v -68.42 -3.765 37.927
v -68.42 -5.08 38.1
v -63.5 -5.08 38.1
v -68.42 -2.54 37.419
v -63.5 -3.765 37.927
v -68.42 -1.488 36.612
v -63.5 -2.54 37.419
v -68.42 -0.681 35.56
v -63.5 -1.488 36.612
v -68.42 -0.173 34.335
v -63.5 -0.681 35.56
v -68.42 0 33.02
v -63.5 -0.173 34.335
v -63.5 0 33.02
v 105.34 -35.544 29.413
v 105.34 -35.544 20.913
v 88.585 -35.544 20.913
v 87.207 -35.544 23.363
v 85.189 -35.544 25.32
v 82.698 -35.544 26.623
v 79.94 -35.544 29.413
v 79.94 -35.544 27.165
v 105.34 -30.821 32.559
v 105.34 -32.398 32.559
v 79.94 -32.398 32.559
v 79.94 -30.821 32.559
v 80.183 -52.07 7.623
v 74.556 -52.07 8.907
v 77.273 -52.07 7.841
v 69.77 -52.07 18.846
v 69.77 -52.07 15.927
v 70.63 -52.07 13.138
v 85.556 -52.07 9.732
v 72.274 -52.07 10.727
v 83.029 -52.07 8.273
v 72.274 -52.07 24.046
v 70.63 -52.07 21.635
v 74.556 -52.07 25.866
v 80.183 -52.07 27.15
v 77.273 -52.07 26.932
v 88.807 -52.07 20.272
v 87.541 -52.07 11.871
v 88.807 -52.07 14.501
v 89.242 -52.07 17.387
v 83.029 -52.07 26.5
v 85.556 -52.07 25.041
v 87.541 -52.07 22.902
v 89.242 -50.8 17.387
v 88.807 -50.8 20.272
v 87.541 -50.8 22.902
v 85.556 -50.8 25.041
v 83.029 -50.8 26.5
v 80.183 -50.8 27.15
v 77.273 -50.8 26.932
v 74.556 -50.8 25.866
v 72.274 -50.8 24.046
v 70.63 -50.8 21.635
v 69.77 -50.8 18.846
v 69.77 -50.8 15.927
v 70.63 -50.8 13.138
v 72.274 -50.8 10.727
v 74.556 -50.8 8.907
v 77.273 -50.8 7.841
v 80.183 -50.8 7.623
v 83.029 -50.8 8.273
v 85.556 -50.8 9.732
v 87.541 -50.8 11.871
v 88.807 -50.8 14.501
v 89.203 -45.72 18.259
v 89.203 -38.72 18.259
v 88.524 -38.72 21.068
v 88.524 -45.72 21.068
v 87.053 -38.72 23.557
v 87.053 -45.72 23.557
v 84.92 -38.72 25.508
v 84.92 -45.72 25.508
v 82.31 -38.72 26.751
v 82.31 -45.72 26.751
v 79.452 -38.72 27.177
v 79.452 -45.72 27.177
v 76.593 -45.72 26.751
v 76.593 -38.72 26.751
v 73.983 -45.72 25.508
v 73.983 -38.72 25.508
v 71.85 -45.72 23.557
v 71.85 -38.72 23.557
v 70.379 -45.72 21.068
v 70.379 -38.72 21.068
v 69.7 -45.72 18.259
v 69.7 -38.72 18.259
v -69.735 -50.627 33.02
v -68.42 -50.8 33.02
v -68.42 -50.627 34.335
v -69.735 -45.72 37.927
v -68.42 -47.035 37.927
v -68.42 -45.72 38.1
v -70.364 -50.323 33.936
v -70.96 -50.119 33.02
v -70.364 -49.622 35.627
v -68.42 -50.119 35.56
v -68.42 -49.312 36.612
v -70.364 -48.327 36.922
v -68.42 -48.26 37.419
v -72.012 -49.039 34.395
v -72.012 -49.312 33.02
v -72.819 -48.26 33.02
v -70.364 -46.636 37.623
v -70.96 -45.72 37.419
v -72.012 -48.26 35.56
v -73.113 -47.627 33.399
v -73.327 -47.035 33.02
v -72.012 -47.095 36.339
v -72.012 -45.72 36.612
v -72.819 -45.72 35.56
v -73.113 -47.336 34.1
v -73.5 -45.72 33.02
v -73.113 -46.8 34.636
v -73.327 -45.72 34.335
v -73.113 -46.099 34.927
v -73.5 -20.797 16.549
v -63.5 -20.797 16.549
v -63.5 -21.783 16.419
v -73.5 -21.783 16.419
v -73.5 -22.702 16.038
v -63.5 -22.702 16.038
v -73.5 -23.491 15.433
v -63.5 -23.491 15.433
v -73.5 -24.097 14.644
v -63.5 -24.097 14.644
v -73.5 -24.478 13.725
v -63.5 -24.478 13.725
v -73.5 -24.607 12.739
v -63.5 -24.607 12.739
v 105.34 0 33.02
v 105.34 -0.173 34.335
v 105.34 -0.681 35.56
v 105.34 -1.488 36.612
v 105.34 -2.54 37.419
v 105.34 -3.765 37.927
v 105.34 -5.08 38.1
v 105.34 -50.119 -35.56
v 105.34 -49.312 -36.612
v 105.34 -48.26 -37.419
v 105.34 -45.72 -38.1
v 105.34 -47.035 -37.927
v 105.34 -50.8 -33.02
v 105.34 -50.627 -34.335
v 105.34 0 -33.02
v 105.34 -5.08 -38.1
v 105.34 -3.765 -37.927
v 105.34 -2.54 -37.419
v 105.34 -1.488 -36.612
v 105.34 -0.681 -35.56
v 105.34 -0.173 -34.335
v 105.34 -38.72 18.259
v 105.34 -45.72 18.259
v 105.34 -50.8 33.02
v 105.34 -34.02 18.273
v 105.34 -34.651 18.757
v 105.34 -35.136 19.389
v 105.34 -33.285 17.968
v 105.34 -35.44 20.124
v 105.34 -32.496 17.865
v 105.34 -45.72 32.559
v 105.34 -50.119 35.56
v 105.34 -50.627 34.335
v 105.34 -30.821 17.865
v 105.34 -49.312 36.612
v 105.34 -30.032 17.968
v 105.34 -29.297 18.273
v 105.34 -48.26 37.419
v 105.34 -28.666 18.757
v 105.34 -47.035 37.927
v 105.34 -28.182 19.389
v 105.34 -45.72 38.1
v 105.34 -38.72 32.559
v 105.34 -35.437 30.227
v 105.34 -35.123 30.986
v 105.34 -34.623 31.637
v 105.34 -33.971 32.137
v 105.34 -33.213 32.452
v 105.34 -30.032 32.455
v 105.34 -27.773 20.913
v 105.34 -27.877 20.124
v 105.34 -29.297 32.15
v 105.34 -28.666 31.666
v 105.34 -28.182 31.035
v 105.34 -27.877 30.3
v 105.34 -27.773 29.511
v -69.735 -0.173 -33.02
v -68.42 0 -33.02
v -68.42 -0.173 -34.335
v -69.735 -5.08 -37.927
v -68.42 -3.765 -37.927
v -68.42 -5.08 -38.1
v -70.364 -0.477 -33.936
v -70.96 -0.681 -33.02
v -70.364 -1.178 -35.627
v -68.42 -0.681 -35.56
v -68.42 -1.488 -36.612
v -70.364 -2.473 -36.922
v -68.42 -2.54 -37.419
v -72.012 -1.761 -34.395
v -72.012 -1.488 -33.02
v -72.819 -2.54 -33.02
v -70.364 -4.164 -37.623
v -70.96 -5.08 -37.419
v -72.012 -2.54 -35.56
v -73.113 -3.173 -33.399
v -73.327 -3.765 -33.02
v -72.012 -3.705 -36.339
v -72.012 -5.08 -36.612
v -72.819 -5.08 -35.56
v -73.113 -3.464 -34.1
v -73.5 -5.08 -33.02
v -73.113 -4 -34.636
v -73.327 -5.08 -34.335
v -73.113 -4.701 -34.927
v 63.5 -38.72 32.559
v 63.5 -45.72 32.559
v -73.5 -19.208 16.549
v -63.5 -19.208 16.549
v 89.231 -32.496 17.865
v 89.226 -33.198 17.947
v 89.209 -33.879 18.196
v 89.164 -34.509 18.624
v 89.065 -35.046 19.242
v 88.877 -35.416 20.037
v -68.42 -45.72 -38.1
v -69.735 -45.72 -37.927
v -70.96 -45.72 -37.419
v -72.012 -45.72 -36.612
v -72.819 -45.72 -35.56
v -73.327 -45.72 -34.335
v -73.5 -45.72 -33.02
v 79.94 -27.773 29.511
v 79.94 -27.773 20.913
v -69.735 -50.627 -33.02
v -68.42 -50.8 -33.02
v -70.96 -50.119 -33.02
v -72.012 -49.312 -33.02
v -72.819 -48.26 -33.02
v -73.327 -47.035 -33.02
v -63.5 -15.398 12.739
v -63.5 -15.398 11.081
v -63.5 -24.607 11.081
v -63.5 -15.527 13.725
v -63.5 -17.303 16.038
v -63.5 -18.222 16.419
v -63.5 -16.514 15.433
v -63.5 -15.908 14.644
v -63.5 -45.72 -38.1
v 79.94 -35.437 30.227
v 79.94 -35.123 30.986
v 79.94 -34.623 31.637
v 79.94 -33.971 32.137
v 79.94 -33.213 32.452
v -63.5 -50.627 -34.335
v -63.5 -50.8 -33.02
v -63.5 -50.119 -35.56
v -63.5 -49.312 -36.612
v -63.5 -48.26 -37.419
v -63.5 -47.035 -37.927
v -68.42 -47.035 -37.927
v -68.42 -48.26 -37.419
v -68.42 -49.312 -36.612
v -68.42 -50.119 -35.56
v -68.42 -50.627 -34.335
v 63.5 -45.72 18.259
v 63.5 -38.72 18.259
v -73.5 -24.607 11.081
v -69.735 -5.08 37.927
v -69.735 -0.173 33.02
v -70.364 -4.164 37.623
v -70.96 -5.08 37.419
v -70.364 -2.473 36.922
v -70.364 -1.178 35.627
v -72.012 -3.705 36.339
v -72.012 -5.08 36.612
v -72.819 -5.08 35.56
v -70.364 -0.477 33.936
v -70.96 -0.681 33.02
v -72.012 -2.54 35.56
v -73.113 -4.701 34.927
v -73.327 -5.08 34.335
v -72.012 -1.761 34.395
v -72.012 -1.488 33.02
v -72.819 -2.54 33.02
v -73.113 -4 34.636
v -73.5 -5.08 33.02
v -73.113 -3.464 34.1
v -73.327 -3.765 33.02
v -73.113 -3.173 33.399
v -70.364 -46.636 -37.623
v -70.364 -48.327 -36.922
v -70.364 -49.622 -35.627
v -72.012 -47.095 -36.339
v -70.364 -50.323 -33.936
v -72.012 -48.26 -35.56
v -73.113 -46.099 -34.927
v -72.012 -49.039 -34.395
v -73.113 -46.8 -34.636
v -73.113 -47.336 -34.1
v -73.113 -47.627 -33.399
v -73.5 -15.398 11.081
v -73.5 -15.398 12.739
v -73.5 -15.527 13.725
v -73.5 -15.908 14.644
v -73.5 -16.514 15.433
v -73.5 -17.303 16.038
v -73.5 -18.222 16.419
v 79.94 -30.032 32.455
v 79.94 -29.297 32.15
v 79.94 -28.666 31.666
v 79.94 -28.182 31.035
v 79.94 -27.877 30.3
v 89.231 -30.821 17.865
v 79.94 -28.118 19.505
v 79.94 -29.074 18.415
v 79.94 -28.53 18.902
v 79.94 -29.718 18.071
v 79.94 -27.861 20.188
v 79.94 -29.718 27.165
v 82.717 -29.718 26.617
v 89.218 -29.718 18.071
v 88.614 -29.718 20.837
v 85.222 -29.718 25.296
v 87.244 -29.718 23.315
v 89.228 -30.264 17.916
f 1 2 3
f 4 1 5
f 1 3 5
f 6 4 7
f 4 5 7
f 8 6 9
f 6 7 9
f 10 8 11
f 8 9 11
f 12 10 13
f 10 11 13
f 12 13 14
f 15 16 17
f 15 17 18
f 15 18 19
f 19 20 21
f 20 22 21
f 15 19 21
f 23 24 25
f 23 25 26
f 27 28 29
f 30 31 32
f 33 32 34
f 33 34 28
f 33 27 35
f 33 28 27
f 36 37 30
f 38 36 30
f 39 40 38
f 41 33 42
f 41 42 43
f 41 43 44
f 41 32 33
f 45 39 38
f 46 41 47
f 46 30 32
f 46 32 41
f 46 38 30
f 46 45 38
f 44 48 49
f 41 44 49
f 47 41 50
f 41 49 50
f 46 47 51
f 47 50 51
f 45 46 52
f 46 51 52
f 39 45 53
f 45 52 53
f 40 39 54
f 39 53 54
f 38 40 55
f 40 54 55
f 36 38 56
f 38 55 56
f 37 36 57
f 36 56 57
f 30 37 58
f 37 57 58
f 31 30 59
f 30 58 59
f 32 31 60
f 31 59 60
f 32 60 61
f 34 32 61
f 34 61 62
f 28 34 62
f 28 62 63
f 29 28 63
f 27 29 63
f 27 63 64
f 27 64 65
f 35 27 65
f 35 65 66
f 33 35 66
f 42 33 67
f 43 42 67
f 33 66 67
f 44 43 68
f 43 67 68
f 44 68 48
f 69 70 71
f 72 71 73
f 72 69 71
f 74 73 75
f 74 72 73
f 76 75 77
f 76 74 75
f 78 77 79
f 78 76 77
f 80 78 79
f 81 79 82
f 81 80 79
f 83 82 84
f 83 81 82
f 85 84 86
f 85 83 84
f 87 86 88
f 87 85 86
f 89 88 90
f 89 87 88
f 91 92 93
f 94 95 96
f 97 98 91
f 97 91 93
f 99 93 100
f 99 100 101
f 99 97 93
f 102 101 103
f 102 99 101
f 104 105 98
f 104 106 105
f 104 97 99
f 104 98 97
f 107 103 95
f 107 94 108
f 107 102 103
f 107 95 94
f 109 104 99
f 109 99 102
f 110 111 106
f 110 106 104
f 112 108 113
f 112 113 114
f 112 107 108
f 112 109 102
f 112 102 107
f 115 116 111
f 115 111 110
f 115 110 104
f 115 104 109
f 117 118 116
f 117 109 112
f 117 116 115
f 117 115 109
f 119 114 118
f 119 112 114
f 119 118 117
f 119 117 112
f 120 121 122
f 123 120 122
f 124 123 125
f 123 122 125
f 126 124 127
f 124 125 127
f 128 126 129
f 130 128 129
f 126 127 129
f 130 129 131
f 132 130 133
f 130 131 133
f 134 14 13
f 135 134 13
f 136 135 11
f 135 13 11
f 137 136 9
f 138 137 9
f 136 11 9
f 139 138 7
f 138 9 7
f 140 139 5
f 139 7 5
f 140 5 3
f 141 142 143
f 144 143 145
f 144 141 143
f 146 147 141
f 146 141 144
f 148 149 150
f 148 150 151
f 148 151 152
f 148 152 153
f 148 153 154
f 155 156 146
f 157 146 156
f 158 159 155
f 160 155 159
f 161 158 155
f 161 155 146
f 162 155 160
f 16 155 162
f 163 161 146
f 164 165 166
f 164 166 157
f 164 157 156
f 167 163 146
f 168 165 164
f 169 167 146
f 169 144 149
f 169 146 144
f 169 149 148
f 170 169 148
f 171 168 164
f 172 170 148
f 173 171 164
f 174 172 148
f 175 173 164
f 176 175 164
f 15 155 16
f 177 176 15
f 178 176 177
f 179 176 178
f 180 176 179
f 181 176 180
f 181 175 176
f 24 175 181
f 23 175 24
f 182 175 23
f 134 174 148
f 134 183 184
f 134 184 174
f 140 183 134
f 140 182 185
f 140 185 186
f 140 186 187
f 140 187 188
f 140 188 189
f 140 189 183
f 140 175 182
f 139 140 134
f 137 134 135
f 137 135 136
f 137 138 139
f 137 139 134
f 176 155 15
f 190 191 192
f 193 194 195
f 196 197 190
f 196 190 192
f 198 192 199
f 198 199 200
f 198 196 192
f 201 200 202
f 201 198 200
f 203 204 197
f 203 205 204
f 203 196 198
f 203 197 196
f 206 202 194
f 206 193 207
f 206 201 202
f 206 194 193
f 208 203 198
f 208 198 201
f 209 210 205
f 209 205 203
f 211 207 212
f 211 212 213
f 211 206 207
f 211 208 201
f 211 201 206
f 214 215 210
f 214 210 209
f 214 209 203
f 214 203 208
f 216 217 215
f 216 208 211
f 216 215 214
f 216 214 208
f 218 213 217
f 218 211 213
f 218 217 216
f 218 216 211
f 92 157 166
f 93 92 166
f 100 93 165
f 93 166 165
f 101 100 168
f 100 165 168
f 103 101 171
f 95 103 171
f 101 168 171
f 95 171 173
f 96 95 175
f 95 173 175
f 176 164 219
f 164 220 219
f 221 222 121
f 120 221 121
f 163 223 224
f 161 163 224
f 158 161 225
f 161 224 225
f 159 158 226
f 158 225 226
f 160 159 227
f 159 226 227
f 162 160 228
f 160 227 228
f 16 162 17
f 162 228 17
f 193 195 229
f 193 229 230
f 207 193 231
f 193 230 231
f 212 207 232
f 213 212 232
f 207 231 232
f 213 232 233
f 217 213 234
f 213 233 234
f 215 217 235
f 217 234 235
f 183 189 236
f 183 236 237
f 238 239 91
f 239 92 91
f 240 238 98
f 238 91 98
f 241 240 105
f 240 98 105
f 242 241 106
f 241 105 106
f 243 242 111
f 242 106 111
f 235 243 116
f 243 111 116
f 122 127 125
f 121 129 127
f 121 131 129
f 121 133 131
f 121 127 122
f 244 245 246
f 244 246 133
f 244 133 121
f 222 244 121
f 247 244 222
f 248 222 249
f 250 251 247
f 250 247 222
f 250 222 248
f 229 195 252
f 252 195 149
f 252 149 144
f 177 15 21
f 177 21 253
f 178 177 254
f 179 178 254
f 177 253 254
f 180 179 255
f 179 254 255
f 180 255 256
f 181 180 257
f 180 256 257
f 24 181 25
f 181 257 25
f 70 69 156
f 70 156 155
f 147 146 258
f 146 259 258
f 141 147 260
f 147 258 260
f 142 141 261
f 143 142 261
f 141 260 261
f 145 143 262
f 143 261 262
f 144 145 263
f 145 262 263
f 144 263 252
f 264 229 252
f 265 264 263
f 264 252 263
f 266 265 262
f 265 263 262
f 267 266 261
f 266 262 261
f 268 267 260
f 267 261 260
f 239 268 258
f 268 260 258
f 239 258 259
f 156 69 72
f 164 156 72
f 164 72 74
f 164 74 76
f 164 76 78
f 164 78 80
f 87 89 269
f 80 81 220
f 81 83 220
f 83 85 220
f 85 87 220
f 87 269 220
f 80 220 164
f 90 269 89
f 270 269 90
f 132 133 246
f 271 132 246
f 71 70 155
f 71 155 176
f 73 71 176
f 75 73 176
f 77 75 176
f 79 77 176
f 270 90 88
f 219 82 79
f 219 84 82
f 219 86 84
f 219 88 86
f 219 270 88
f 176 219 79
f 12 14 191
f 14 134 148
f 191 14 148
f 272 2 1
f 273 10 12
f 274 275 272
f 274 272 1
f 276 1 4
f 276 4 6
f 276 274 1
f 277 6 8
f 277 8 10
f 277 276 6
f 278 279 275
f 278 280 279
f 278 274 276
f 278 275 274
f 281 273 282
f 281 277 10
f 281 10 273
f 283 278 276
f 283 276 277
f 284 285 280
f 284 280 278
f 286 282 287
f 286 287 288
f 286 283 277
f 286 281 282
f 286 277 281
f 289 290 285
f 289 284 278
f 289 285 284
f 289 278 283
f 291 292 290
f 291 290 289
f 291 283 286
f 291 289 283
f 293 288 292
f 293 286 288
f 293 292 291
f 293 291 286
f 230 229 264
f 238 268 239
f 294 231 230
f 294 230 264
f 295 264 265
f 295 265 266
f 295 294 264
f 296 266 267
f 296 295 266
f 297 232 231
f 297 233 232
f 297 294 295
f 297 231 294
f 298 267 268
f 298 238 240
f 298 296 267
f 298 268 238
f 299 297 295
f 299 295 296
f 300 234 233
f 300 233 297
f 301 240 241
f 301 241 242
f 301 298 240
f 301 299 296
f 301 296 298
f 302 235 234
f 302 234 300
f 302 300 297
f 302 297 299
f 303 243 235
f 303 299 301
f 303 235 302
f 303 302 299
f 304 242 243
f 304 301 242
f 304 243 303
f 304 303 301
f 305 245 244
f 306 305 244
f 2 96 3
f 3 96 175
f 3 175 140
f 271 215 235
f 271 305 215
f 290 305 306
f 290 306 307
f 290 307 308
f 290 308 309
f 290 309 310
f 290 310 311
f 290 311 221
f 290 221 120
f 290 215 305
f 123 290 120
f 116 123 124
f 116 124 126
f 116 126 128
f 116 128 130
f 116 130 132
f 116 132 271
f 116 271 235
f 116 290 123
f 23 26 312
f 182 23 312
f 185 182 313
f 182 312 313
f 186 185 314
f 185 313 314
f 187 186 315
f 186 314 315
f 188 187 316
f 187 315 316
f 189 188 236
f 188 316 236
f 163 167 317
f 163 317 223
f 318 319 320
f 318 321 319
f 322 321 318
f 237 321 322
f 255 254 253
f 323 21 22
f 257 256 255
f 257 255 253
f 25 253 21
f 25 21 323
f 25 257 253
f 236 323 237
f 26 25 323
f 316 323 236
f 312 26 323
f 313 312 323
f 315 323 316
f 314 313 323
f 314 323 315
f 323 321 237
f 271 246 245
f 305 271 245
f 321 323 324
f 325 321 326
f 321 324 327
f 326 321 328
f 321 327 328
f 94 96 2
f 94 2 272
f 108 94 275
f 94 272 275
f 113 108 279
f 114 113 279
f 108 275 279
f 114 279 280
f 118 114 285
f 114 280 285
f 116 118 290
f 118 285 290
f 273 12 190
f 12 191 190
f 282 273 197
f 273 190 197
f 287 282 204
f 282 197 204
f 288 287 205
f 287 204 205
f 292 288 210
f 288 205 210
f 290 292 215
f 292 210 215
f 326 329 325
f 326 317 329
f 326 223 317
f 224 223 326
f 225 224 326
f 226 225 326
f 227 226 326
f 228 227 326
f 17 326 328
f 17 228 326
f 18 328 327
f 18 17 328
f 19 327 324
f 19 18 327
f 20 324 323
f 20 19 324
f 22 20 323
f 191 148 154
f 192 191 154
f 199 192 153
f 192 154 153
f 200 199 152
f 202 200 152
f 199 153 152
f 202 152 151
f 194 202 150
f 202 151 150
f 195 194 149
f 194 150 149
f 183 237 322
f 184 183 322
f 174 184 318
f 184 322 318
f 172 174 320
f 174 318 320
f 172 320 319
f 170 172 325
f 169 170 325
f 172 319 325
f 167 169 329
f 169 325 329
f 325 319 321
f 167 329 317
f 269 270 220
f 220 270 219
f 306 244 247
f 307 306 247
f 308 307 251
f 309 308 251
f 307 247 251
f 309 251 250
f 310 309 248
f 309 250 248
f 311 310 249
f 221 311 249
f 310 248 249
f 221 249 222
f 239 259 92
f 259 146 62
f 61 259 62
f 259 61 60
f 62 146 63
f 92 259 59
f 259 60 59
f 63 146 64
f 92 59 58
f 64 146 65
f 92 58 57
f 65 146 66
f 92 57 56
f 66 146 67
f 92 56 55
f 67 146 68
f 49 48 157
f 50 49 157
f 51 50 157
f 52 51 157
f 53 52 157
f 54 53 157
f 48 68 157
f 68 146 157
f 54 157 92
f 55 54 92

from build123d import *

# Parameters (mm, degrees)
F0_W      = 127
F0_H      = 76.2
F1_DEPTH  = 50.8
F2_R      = 5.08
F3_W      = 7
F3_H      = 14.7
F4_DEPTH  = 16.4
F5_W      = 7
F5_H      = 14.3
F6_DEPTH  = 16.44
F7_W      = 7
F7_H      = 14.3
F8_DEPTH  = 25.4
F9_R      = 9.7907841867
F10_DEPTH = 1.27
F11_DEPTH = 22.352
F13_DEPTH = 25.4
F14_DEPTH = 25.4
F15_DEPTH = 25.4
F16_DEPTH = 10
F17_R     = 5.08


with BuildPart() as f1:
    # F0 (on Front) → F1 (new body)
    with BuildSketch(Plane.XZ):
        Rectangle(F0_W, F0_H)
    extrude(amount=F1_DEPTH)

    # F2
    f2_edges = [f1.edges().sort_by_distance(p)[0] for p in [
        (0, -50.8, 38.1),
        (0, 0, 38.1),
        (0, -50.8, -38.1),
        (0, 0, -38.1),
    ]]
    fillet(f2_edges, radius=F2_R)

    # F3 (on face) → F4 (join)
    with BuildSketch(Plane.YZ.offset(63.5)):
        with BuildLine():
            Line((-5.08, 38.1), (-45.72, 38.1))
            ThreePointArc((-45.72, 38.1), (-49.3121024484, 36.6121024484), (-50.8, 33.02))
            Line((-50.8, 33.02), (-50.8, -33.02))
            ThreePointArc((-50.8, -33.02), (-49.3121024484, -36.6121024484), (-45.72, -38.1))
            Line((-45.72, -38.1), (-5.08, -38.1))
            ThreePointArc((-5.08, -38.1), (-1.4878975516, -36.6121024484), (0, -33.02))
            Line((0, -33.02), (0, 33.02))
            ThreePointArc((0, 33.02), (-1.4878975516, 36.6121024484), (-5.08, 38.1))
        make_face()
        with Locations((-42.22, 25.675587382)):
            Rectangle(F3_W, F3_H, mode=Mode.SUBTRACT)
        with Locations((-42.22, 25.675587382)):
            Rectangle(F3_W, F3_H)
    extrude(amount=-F4_DEPTH)

    # F5 (on face) → F6 (join)
    with BuildSketch(Plane.YZ.offset(63.5)):
        with BuildLine():
            ThreePointArc((-50.8, -33.02), (-49.3121024484, -36.6121024484), (-45.72, -38.1))
            Line((-45.72, -38.1), (-5.08, -38.1))
            ThreePointArc((-5.08, -38.1), (-1.4878975516, -36.6121024484), (0, -33.02))
            Line((0, -33.02), (0, 33.02))
            ThreePointArc((0, 33.02), (-1.4878975516, 36.6121024484), (-5.08, 38.1))
            Line((-5.08, 38.1), (-45.72, 38.1))
            ThreePointArc((-45.72, 38.1), (-49.3121024484, 36.6121024484), (-50.8, 33.02))
            Line((-50.8, 33.02), (-50.8, -33.02))
        make_face()
        with Locations((-42.22, 25.4086919344)):
            Rectangle(F5_W, F5_H, mode=Mode.SUBTRACT)
    extrude(amount=F6_DEPTH)

    # F7 (on face) → F8 (join)
    with BuildSketch(Plane.YZ.offset(79.94)):
        with BuildLine():
            Line((-5.08, 38.1), (-45.72, 38.1))
            ThreePointArc((-45.72, 38.1), (-49.3121024484, 36.6121024484), (-50.8, 33.02))
            Line((-50.8, 33.02), (-50.8, -33.02))
            ThreePointArc((-50.8, -33.02), (-49.3121024484, -36.6121024484), (-45.72, -38.1))
            Line((-45.72, -38.1), (-5.08, -38.1))
            ThreePointArc((-5.08, -38.1), (-1.4878975516, -36.6121024484), (0, -33.02))
            Line((0, -33.02), (0, 33.02))
            ThreePointArc((0, 33.02), (-1.4878975516, 36.6121024484), (-5.08, 38.1))
        make_face()
        with Locations((-42.22, 25.4086919344)):
            Rectangle(F7_W, F7_H, mode=Mode.SUBTRACT)
        with BuildLine():
            Line((-35.5440098792, 20.9126272823), (-35.5440098792, 29.4131070442))
            ThreePointArc((-35.5440098792, 29.4131070442), (-34.6226893957, 31.6373714509), (-32.398424989, 32.5586919344))
            Line((-32.398424989, 32.5586919344), (-30.8212536197, 32.5586919344))
            ThreePointArc((-30.8212536197, 32.5586919344), (-28.6659921506, 31.6659534035), (-27.7732536197, 29.5106919344))
            Line((-27.7732536197, 29.5106919344), (-27.7732536197, 20.9126272823))
            ThreePointArc((-27.7732536197, 20.9126272823), (-28.6659921506, 18.7573658132), (-30.8212536197, 17.8646272823))
            Line((-30.8212536197, 17.8646272823), (-32.4960098792, 17.8646272823))
            ThreePointArc((-32.4960098792, 17.8646272823), (-34.6512713483, 18.7573658132), (-35.5440098792, 20.9126272823))
        make_face(mode=Mode.SUBTRACT)
    extrude(amount=F8_DEPTH)

    # F9 (on face) → F10 (join)
    with BuildSketch(Plane.XZ.offset(50.8)):
        with Locations((79.4515386224, 17.386501655)):
            Circle(F9_R)
    extrude(amount=F10_DEPTH)

    # F11 (add): a face of the model
    f11_faces = [f1.faces().sort_by_distance(p)[0] for p in [
        (79.4515386224, -52.07, 17.386501655),
    ]]
    extrude(f11_faces, amount=-F11_DEPTH)

    # F12 (on face) → F13 (join)
    with BuildSketch(Plane(origin=(-63.5, 0, 0), x_dir=(0, -1, 0), z_dir=(-1, 0, 0))):
        with BuildLine():
            Line((20.797392028, 16.5488310158), (19.2076092115, 16.5488310158))
            ThreePointArc((19.2076092115, 16.5488310158), (16.5135323752, 15.4329078521), (15.3976092115, 12.7388310158))
            Line((15.3976092115, 12.7388310158), (15.3976092115, 11.0805211589))
            Line((15.3976092115, 11.0805211589), (15.6854148954, 11.0805211589))
            Line((15.6854148954, 11.0805211589), (24.607392028, 11.0805211589))
            Line((24.607392028, 11.0805211589), (24.607392028, 12.7388310158))
            ThreePointArc((24.607392028, 12.7388310158), (23.4914688643, 15.4329078521), (20.797392028, 16.5488310158))
        make_face()
    extrude(amount=-F13_DEPTH)

    # F12 (on face) → F14 (join)
    with BuildSketch(Plane(origin=(-63.5, 0, 0), x_dir=(0, -1, 0), z_dir=(-1, 0, 0))):
        with BuildLine():
            Line((20.797392028, 16.5488310158), (19.2076092115, 16.5488310158))
            ThreePointArc((19.2076092115, 16.5488310158), (16.5135323752, 15.4329078521), (15.3976092115, 12.7388310158))
            Line((15.3976092115, 12.7388310158), (15.3976092115, 11.0805211589))
            Line((15.3976092115, 11.0805211589), (15.6854148954, 11.0805211589))
            Line((15.6854148954, 11.0805211589), (24.607392028, 11.0805211589))
            Line((24.607392028, 11.0805211589), (24.607392028, 12.7388310158))
            ThreePointArc((24.607392028, 12.7388310158), (23.4914688643, 15.4329078521), (20.797392028, 16.5488310158))
        make_face()
    extrude(amount=-F14_DEPTH)

    # F12 (on face) → F15 (join)
    with BuildSketch(Plane(origin=(-63.5, 0, 0), x_dir=(0, -1, 0), z_dir=(-1, 0, 0))):
        with BuildLine():
            Line((20.797392028, 16.5488310158), (19.2076092115, 16.5488310158))
            ThreePointArc((19.2076092115, 16.5488310158), (16.5135323752, 15.4329078521), (15.3976092115, 12.7388310158))
            Line((15.3976092115, 12.7388310158), (15.3976092115, 11.0805211589))
            Line((15.3976092115, 11.0805211589), (15.6854148954, 11.0805211589))
            Line((15.6854148954, 11.0805211589), (24.607392028, 11.0805211589))
            Line((24.607392028, 11.0805211589), (24.607392028, 12.7388310158))
            ThreePointArc((24.607392028, 12.7388310158), (23.4914688643, 15.4329078521), (20.797392028, 16.5488310158))
        make_face()
    extrude(amount=-F15_DEPTH)

    # F12 (on face) → F16 (join)
    with BuildSketch(Plane(origin=(-63.5, 0, 0), x_dir=(0, -1, 0), z_dir=(-1, 0, 0))):
        with BuildLine():
            ThreePointArc((50.8, 33.02), (49.3121024484, 36.6121024484), (45.72, 38.1))
            Line((45.72, 38.1), (5.08, 38.1))
            ThreePointArc((5.08, 38.1), (1.4878975516, 36.6121024484), (0, 33.02))
            Line((0, 33.02), (0, -33.02))
            ThreePointArc((0, -33.02), (1.4878975516, -36.6121024484), (5.08, -38.1))
            Line((5.08, -38.1), (45.72, -38.1))
            ThreePointArc((45.72, -38.1), (49.3121024484, -36.6121024484), (50.8, -33.02))
            Line((50.8, -33.02), (50.8, 33.02))
        make_face()
        with BuildLine():
            ThreePointArc((15.3976092115, 12.7388310158), (16.5135323752, 15.4329078521), (19.2076092115, 16.5488310158))
            Line((19.2076092115, 16.5488310158), (20.797392028, 16.5488310158))
            ThreePointArc((20.797392028, 16.5488310158), (23.4914688643, 15.4329078521), (24.607392028, 12.7388310158))
            Line((24.607392028, 12.7388310158), (24.607392028, 11.0805211589))
            Line((24.607392028, 11.0805211589), (15.6854148954, 11.0805211589))
            Line((15.6854148954, 11.0805211589), (15.3976092115, 11.0805211589))
            Line((15.3976092115, 11.0805211589), (15.3976092115, 12.7388310158))
        make_face(mode=Mode.SUBTRACT)
    extrude(amount=F16_DEPTH)

    # F17
    f17_edges = [f1.edges().sort_by_distance(p)[0] for p in [
        (-73.5, -25.4, 38.1),
        (-73.5, 0, 0),
        (-73.5, -25.4, -38.1),
        (-73.5, -50.8, 0),
        (-73.5, -49.312102, 36.612102),
        (-73.5, -1.487898, 36.612102),
        (-73.5, -49.312102, -36.612102),
        (-73.5, -1.487898, -36.612102),
    ]]
    fillet(f17_edges, radius=F17_R)


solid = f1.part
